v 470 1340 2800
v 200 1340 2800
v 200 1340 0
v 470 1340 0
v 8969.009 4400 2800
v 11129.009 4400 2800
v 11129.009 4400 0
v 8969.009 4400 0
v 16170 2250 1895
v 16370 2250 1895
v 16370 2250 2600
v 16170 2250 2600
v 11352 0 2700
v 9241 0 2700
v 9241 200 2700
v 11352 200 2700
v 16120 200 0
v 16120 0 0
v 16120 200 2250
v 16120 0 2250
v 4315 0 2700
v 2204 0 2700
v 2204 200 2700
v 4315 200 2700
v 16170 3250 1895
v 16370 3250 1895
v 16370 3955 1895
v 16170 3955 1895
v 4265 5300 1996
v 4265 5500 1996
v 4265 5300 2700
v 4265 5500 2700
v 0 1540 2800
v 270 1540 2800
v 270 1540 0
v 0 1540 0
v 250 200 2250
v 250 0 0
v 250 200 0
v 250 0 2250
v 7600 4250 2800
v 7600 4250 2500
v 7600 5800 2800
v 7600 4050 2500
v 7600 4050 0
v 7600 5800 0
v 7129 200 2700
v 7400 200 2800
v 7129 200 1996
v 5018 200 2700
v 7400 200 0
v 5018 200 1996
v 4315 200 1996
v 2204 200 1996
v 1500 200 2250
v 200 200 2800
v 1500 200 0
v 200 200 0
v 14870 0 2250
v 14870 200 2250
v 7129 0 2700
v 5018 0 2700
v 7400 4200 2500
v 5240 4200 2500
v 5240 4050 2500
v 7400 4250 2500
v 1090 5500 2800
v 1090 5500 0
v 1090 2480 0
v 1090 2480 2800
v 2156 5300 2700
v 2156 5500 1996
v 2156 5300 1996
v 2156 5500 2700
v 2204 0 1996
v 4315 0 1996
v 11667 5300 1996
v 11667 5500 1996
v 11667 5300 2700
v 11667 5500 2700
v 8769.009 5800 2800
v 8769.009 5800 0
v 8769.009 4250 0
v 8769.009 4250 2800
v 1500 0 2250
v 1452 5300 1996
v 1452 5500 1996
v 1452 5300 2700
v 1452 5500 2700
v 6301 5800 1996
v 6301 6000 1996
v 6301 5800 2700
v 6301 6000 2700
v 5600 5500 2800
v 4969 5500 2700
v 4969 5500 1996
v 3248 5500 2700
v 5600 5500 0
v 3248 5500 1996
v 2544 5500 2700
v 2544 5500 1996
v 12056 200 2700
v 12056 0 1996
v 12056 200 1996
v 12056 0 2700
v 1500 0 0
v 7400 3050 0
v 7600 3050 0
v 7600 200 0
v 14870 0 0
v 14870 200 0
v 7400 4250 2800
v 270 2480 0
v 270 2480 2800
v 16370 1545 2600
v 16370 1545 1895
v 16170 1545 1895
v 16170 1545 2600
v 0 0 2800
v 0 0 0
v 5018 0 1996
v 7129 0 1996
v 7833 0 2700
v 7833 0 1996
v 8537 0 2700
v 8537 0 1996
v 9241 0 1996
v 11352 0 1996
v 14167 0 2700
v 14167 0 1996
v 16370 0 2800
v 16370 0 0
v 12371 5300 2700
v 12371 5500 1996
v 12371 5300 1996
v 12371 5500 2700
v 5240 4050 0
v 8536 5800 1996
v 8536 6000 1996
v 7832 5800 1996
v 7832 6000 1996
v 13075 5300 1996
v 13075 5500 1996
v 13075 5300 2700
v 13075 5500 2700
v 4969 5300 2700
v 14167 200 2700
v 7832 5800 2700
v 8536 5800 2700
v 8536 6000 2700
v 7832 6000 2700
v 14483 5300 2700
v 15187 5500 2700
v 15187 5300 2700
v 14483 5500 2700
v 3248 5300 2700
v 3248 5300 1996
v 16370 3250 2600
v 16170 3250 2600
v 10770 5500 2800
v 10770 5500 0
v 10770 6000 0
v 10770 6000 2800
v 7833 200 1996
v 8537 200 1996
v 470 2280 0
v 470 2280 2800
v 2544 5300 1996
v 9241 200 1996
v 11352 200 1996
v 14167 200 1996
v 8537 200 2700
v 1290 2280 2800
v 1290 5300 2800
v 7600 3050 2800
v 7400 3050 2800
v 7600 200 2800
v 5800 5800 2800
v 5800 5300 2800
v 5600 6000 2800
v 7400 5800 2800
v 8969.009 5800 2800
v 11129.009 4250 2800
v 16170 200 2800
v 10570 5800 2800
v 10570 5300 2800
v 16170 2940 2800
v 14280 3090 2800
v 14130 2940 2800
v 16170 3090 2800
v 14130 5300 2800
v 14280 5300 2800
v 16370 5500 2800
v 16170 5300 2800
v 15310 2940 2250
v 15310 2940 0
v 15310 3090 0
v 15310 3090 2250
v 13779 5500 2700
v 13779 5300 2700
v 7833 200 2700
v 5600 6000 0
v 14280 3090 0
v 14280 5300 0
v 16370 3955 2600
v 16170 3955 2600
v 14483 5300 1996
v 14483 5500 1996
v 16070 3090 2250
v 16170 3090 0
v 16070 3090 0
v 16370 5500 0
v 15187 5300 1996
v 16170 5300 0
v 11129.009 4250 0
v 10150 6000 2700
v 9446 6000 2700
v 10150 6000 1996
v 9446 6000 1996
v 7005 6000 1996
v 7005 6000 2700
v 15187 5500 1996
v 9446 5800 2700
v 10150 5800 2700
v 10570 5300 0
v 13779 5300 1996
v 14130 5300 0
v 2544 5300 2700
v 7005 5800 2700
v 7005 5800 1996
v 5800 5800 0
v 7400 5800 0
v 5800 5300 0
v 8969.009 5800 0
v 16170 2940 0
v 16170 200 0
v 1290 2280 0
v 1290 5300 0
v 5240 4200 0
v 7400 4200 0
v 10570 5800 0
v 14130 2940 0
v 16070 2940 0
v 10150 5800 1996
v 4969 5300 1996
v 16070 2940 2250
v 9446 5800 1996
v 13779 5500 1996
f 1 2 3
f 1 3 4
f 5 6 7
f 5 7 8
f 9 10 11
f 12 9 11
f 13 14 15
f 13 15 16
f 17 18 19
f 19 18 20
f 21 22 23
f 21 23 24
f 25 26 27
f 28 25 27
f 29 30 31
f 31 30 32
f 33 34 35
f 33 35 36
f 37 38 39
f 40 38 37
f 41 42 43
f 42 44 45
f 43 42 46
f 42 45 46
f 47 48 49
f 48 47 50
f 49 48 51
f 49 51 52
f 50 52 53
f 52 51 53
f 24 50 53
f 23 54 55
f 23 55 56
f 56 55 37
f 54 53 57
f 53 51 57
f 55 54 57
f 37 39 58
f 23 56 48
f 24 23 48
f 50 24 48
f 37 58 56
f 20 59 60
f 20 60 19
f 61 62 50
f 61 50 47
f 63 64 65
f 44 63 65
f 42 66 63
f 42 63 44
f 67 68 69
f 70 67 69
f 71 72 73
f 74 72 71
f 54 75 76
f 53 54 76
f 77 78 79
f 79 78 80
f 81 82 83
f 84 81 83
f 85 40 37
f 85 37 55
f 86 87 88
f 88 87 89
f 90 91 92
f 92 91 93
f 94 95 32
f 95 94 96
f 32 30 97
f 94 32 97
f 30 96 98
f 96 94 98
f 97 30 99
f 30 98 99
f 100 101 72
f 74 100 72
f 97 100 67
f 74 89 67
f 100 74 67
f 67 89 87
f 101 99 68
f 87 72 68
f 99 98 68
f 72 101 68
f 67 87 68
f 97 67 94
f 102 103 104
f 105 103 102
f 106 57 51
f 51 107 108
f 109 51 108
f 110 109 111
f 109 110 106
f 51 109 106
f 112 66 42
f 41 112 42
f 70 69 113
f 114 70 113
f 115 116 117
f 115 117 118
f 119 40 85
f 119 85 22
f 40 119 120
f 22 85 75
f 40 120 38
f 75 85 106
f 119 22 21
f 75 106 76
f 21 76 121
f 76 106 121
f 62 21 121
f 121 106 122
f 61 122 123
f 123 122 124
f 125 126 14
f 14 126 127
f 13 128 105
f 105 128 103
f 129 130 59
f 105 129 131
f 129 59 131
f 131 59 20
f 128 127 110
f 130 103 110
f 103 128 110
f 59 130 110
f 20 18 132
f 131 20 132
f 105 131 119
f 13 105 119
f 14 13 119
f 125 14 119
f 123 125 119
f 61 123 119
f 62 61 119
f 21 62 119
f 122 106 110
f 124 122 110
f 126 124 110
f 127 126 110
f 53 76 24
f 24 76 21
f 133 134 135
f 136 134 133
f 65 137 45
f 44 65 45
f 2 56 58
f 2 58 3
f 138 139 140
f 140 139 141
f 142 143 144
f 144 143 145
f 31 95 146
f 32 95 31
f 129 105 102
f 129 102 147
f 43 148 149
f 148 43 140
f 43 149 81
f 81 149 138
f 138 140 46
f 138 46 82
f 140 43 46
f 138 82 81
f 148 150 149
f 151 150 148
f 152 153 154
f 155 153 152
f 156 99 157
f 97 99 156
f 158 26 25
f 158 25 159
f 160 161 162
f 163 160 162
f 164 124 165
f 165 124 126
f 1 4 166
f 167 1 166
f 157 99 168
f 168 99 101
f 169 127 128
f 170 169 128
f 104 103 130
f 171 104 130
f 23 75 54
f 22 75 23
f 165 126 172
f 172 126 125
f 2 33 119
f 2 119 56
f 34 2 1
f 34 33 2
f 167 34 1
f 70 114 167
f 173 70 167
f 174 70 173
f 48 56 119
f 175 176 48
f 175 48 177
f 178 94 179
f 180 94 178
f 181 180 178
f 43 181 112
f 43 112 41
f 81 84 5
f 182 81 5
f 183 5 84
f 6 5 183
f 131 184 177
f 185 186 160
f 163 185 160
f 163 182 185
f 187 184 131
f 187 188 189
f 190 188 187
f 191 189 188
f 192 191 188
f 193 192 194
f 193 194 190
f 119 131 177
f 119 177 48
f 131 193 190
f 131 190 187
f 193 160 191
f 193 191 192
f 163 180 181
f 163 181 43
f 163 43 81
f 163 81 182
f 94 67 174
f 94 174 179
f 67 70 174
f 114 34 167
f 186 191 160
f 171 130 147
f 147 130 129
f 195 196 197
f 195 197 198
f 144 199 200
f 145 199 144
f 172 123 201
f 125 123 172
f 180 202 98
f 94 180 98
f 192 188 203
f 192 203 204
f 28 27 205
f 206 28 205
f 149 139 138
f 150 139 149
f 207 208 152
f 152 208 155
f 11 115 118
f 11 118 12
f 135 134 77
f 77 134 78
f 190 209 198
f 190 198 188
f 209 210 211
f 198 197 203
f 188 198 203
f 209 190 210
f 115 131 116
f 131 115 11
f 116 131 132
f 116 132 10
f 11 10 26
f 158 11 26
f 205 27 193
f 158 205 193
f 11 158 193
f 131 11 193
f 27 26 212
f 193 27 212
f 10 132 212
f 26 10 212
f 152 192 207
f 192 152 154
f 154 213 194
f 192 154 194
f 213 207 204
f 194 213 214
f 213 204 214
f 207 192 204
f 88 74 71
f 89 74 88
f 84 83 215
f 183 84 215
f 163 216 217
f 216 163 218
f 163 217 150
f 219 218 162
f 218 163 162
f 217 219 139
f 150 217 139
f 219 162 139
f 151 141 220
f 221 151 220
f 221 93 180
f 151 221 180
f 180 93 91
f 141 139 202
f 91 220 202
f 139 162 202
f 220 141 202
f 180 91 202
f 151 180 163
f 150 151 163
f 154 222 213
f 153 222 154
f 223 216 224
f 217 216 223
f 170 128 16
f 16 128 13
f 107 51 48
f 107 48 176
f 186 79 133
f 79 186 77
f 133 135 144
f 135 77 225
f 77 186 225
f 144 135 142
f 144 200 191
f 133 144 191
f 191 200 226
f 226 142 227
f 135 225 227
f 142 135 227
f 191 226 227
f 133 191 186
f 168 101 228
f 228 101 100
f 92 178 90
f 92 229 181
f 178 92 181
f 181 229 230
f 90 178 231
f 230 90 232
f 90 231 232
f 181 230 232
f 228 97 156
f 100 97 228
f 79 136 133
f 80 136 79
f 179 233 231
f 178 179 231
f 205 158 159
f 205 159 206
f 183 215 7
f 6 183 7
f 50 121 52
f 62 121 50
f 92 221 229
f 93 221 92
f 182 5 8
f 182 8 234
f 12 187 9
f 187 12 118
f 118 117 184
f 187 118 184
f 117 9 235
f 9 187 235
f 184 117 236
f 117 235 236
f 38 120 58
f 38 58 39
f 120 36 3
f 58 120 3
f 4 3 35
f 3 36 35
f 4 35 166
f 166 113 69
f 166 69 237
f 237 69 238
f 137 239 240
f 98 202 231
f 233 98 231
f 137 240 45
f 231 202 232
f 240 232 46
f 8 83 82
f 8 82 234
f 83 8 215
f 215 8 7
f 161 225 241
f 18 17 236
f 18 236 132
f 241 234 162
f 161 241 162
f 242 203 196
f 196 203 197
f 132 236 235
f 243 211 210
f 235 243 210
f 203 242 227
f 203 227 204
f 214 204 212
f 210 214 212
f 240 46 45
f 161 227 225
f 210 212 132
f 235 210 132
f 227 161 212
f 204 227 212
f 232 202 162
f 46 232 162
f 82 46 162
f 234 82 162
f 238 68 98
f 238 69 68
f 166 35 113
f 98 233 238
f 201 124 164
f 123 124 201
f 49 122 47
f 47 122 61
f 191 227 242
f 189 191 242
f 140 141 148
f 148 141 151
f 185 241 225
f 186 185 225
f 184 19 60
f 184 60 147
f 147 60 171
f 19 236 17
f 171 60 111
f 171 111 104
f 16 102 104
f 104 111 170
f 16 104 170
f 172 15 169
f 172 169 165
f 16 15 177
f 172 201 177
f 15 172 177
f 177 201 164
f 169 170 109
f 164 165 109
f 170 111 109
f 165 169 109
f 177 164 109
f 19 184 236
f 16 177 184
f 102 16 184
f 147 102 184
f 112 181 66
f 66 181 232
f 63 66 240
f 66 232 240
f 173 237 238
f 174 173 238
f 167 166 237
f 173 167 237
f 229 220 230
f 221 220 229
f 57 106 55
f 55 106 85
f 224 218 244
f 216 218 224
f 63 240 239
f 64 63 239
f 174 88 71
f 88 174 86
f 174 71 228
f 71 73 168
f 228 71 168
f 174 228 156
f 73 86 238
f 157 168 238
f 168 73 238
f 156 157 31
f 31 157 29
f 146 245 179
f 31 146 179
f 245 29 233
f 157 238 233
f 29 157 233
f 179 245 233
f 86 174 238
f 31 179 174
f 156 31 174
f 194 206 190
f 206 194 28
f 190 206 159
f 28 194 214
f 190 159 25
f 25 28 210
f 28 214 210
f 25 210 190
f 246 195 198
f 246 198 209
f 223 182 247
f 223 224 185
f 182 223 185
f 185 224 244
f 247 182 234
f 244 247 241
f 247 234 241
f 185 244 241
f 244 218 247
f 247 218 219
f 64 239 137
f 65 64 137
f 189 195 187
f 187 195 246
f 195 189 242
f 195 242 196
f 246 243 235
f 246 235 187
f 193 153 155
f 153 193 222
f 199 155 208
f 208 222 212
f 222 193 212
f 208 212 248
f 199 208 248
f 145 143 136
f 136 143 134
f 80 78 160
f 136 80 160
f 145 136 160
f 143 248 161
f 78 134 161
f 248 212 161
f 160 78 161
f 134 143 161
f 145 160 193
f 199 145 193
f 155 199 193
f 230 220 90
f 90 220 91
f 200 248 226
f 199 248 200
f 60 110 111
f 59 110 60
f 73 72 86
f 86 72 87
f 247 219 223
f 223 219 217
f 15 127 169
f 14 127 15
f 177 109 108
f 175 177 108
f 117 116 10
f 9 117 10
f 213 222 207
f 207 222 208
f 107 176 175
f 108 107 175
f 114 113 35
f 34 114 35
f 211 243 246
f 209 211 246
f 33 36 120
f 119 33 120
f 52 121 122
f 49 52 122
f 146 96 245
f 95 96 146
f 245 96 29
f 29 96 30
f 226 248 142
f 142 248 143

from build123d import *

# Parameters (mm, degrees)
F1_DEPTH  = 2800
F2_W      = 1250
F2_H      = 2250
F3_DEPTH  = 200
F4_W      = 1250
F4_H      = 2250
F5_DEPTH  = 200
F11_DEPTH = 2500
F13_DEPTH = 2800
F14_W     = 2111
F14_H     = 704
F14_W_2   = 704
F15_DEPTH = 200
F16_W     = 704
F16_H     = 704
F17_DEPTH = 200
F18_W     = 704
F18_H     = 704
F19_DEPTH = 200
F20_W     = 704
F20_H     = 704
F21_DEPTH = 200
F27_W     = 760
F27_H     = 2250
F28_DEPTH = 150
F29_W     = 705
F29_H     = 705
F30_DEPTH = 200
F32_DEPTH = 2800
F33_W     = 200
F33_H     = 1550
F33_H_2   = 2850
F34_DEPTH = 2800


with BuildPart() as f1:
    # F0 (on Top) → F1 (new body)
    with BuildSketch(Plane.XY):
        Polygon((0, 200), (0, 0), (16370, 0), (16370, 5500), (10770, 5500), (10770, 6000), (5600, 6000), (5600, 5500), (1090, 5500), (1090, 5300), (1090, 2480), (270, 2480), (270, 1540), (0, 1540), align=None)
        Polygon((1290, 5300), (5800, 5300), (5800, 5800), (10570, 5800), (10570, 5300), (16170, 5300), (16170, 200), (200, 200), (200, 1340), (470, 1340), (470, 2280), (936.407268, 2280), (1290, 2280), align=None, mode=Mode.SUBTRACT)
    extrude(amount=F1_DEPTH)

    # F2 (on face) → F3 (cut)
    with BuildSketch(Plane.XZ):
        with Locations((875, 1125)):
            Rectangle(F2_W, F2_H)
    extrude(amount=-F3_DEPTH, mode=Mode.SUBTRACT)

    # F4 (on face) → F5 (cut)
    with BuildSketch(Plane.XZ):
        with Locations((15495, 1125)):
            Rectangle(F4_W, F4_H)
    extrude(amount=-F5_DEPTH, mode=Mode.SUBTRACT)

    # F10 (on Top) → F11 (join)
    with BuildSketch(Plane.XY):
        Polygon((7600, 5800), (7400, 5800), (7400, 4200), (5240, 4200), (5240, 4050), (7600, 4050), align=None)
    extrude(amount=F11_DEPTH)

    # F12 (on Top) → F13 (join)
    with BuildSketch(Plane.XY):
        Polygon((14280, 5300), (14130, 5300), (14130, 2940), (16170, 2940), (16170, 3090), (14280, 3090), align=None)
    extrude(amount=F13_DEPTH)

    # F14 (on face) → F15 (cut)
    with BuildSketch(Plane.XZ):
        with Locations((3259.5, 2348)):
            Rectangle(F14_W, F14_H)
        with Locations((6073.5, 2348)):
            Rectangle(F14_W, F14_H)
        with Locations((8185, 2348)):
            Rectangle(F14_W_2, F14_H)
        with Locations((10296.5, 2348)):
            Rectangle(F14_W, F14_H)
        with Locations((13111.5, 2348)):
            Rectangle(F14_W, F14_H)
    extrude(amount=-F15_DEPTH, mode=Mode.SUBTRACT)

    # F16 (on face) → F17 (cut)
    with BuildSketch(Plane(origin=(0, 5500, 0), x_dir=(-1, 0, 0), z_dir=(0, 1, 0))):
        with Locations((-14835, 2348)):
            Rectangle(F16_W, F16_H)
        with Locations((-13427, 2348)):
            Rectangle(F16_W, F16_H)
        with Locations((-12019, 2348)):
            Rectangle(F16_W, F16_H)
    extrude(amount=-F17_DEPTH, mode=Mode.SUBTRACT)

    # F18 (on face) → F19 (cut)
    with BuildSketch(Plane(origin=(0, 6000, 0), x_dir=(-1, 0, 0), z_dir=(0, 1, 0))):
        with Locations((-9798, 2348)):
            Rectangle(F18_W, F18_H)
        with Locations((-8184, 2348)):
            Rectangle(F18_W, F18_H)
        with Locations((-6653, 2348)):
            Rectangle(F18_W, F18_H)
    extrude(amount=-F19_DEPTH, mode=Mode.SUBTRACT)

    # F20 (on face) → F21 (cut)
    with BuildSketch(Plane(origin=(0, 5500, 0), x_dir=(-1, 0, 0), z_dir=(0, 1, 0))):
        with Locations((-4617, 2348)):
            Rectangle(F20_W, F20_H)
        with Locations((-2896, 2348)):
            Rectangle(F20_W, F20_H)
        with Locations((-1804, 2348)):
            Rectangle(F20_W, F20_H)
    extrude(amount=-F21_DEPTH, mode=Mode.SUBTRACT)

    # F27 (on face) → F28 (cut)
    with BuildSketch(Plane.XZ.offset(-2940)):
        with Locations((15690, 1125)):
            Rectangle(F27_W, F27_H)
    extrude(amount=-F28_DEPTH, mode=Mode.SUBTRACT)

    # F29 (on face) → F30 (cut)
    with BuildSketch(Plane.YZ.offset(16370)):
        with Locations((1897.5, 2247.5)):
            Rectangle(F29_W, F29_H)
        with Locations((3602.5, 2247.5)):
            Rectangle(F29_W, F29_H)
    extrude(amount=-F30_DEPTH, mode=Mode.SUBTRACT)

    # F9 (on Top) → F32 (join)
    with BuildSketch(Plane.XY):
        Polygon((8969.008636, 4400), (8969.008636, 5800), (8769.008636, 5800), (8769.008636, 4250), (11129.008636, 4250), (11129.008636, 4400), align=None)
    extrude(amount=F32_DEPTH)

    # F33 (on Top) → F34 (join)
    with BuildSketch(Plane.XY):
        with Locations((7500, 5025)):
            Rectangle(F33_W, F33_H)
        with Locations((7500, 1625)):
            Rectangle(F33_W, F33_H_2)
    extrude(amount=F34_DEPTH)


solid = f1.part
